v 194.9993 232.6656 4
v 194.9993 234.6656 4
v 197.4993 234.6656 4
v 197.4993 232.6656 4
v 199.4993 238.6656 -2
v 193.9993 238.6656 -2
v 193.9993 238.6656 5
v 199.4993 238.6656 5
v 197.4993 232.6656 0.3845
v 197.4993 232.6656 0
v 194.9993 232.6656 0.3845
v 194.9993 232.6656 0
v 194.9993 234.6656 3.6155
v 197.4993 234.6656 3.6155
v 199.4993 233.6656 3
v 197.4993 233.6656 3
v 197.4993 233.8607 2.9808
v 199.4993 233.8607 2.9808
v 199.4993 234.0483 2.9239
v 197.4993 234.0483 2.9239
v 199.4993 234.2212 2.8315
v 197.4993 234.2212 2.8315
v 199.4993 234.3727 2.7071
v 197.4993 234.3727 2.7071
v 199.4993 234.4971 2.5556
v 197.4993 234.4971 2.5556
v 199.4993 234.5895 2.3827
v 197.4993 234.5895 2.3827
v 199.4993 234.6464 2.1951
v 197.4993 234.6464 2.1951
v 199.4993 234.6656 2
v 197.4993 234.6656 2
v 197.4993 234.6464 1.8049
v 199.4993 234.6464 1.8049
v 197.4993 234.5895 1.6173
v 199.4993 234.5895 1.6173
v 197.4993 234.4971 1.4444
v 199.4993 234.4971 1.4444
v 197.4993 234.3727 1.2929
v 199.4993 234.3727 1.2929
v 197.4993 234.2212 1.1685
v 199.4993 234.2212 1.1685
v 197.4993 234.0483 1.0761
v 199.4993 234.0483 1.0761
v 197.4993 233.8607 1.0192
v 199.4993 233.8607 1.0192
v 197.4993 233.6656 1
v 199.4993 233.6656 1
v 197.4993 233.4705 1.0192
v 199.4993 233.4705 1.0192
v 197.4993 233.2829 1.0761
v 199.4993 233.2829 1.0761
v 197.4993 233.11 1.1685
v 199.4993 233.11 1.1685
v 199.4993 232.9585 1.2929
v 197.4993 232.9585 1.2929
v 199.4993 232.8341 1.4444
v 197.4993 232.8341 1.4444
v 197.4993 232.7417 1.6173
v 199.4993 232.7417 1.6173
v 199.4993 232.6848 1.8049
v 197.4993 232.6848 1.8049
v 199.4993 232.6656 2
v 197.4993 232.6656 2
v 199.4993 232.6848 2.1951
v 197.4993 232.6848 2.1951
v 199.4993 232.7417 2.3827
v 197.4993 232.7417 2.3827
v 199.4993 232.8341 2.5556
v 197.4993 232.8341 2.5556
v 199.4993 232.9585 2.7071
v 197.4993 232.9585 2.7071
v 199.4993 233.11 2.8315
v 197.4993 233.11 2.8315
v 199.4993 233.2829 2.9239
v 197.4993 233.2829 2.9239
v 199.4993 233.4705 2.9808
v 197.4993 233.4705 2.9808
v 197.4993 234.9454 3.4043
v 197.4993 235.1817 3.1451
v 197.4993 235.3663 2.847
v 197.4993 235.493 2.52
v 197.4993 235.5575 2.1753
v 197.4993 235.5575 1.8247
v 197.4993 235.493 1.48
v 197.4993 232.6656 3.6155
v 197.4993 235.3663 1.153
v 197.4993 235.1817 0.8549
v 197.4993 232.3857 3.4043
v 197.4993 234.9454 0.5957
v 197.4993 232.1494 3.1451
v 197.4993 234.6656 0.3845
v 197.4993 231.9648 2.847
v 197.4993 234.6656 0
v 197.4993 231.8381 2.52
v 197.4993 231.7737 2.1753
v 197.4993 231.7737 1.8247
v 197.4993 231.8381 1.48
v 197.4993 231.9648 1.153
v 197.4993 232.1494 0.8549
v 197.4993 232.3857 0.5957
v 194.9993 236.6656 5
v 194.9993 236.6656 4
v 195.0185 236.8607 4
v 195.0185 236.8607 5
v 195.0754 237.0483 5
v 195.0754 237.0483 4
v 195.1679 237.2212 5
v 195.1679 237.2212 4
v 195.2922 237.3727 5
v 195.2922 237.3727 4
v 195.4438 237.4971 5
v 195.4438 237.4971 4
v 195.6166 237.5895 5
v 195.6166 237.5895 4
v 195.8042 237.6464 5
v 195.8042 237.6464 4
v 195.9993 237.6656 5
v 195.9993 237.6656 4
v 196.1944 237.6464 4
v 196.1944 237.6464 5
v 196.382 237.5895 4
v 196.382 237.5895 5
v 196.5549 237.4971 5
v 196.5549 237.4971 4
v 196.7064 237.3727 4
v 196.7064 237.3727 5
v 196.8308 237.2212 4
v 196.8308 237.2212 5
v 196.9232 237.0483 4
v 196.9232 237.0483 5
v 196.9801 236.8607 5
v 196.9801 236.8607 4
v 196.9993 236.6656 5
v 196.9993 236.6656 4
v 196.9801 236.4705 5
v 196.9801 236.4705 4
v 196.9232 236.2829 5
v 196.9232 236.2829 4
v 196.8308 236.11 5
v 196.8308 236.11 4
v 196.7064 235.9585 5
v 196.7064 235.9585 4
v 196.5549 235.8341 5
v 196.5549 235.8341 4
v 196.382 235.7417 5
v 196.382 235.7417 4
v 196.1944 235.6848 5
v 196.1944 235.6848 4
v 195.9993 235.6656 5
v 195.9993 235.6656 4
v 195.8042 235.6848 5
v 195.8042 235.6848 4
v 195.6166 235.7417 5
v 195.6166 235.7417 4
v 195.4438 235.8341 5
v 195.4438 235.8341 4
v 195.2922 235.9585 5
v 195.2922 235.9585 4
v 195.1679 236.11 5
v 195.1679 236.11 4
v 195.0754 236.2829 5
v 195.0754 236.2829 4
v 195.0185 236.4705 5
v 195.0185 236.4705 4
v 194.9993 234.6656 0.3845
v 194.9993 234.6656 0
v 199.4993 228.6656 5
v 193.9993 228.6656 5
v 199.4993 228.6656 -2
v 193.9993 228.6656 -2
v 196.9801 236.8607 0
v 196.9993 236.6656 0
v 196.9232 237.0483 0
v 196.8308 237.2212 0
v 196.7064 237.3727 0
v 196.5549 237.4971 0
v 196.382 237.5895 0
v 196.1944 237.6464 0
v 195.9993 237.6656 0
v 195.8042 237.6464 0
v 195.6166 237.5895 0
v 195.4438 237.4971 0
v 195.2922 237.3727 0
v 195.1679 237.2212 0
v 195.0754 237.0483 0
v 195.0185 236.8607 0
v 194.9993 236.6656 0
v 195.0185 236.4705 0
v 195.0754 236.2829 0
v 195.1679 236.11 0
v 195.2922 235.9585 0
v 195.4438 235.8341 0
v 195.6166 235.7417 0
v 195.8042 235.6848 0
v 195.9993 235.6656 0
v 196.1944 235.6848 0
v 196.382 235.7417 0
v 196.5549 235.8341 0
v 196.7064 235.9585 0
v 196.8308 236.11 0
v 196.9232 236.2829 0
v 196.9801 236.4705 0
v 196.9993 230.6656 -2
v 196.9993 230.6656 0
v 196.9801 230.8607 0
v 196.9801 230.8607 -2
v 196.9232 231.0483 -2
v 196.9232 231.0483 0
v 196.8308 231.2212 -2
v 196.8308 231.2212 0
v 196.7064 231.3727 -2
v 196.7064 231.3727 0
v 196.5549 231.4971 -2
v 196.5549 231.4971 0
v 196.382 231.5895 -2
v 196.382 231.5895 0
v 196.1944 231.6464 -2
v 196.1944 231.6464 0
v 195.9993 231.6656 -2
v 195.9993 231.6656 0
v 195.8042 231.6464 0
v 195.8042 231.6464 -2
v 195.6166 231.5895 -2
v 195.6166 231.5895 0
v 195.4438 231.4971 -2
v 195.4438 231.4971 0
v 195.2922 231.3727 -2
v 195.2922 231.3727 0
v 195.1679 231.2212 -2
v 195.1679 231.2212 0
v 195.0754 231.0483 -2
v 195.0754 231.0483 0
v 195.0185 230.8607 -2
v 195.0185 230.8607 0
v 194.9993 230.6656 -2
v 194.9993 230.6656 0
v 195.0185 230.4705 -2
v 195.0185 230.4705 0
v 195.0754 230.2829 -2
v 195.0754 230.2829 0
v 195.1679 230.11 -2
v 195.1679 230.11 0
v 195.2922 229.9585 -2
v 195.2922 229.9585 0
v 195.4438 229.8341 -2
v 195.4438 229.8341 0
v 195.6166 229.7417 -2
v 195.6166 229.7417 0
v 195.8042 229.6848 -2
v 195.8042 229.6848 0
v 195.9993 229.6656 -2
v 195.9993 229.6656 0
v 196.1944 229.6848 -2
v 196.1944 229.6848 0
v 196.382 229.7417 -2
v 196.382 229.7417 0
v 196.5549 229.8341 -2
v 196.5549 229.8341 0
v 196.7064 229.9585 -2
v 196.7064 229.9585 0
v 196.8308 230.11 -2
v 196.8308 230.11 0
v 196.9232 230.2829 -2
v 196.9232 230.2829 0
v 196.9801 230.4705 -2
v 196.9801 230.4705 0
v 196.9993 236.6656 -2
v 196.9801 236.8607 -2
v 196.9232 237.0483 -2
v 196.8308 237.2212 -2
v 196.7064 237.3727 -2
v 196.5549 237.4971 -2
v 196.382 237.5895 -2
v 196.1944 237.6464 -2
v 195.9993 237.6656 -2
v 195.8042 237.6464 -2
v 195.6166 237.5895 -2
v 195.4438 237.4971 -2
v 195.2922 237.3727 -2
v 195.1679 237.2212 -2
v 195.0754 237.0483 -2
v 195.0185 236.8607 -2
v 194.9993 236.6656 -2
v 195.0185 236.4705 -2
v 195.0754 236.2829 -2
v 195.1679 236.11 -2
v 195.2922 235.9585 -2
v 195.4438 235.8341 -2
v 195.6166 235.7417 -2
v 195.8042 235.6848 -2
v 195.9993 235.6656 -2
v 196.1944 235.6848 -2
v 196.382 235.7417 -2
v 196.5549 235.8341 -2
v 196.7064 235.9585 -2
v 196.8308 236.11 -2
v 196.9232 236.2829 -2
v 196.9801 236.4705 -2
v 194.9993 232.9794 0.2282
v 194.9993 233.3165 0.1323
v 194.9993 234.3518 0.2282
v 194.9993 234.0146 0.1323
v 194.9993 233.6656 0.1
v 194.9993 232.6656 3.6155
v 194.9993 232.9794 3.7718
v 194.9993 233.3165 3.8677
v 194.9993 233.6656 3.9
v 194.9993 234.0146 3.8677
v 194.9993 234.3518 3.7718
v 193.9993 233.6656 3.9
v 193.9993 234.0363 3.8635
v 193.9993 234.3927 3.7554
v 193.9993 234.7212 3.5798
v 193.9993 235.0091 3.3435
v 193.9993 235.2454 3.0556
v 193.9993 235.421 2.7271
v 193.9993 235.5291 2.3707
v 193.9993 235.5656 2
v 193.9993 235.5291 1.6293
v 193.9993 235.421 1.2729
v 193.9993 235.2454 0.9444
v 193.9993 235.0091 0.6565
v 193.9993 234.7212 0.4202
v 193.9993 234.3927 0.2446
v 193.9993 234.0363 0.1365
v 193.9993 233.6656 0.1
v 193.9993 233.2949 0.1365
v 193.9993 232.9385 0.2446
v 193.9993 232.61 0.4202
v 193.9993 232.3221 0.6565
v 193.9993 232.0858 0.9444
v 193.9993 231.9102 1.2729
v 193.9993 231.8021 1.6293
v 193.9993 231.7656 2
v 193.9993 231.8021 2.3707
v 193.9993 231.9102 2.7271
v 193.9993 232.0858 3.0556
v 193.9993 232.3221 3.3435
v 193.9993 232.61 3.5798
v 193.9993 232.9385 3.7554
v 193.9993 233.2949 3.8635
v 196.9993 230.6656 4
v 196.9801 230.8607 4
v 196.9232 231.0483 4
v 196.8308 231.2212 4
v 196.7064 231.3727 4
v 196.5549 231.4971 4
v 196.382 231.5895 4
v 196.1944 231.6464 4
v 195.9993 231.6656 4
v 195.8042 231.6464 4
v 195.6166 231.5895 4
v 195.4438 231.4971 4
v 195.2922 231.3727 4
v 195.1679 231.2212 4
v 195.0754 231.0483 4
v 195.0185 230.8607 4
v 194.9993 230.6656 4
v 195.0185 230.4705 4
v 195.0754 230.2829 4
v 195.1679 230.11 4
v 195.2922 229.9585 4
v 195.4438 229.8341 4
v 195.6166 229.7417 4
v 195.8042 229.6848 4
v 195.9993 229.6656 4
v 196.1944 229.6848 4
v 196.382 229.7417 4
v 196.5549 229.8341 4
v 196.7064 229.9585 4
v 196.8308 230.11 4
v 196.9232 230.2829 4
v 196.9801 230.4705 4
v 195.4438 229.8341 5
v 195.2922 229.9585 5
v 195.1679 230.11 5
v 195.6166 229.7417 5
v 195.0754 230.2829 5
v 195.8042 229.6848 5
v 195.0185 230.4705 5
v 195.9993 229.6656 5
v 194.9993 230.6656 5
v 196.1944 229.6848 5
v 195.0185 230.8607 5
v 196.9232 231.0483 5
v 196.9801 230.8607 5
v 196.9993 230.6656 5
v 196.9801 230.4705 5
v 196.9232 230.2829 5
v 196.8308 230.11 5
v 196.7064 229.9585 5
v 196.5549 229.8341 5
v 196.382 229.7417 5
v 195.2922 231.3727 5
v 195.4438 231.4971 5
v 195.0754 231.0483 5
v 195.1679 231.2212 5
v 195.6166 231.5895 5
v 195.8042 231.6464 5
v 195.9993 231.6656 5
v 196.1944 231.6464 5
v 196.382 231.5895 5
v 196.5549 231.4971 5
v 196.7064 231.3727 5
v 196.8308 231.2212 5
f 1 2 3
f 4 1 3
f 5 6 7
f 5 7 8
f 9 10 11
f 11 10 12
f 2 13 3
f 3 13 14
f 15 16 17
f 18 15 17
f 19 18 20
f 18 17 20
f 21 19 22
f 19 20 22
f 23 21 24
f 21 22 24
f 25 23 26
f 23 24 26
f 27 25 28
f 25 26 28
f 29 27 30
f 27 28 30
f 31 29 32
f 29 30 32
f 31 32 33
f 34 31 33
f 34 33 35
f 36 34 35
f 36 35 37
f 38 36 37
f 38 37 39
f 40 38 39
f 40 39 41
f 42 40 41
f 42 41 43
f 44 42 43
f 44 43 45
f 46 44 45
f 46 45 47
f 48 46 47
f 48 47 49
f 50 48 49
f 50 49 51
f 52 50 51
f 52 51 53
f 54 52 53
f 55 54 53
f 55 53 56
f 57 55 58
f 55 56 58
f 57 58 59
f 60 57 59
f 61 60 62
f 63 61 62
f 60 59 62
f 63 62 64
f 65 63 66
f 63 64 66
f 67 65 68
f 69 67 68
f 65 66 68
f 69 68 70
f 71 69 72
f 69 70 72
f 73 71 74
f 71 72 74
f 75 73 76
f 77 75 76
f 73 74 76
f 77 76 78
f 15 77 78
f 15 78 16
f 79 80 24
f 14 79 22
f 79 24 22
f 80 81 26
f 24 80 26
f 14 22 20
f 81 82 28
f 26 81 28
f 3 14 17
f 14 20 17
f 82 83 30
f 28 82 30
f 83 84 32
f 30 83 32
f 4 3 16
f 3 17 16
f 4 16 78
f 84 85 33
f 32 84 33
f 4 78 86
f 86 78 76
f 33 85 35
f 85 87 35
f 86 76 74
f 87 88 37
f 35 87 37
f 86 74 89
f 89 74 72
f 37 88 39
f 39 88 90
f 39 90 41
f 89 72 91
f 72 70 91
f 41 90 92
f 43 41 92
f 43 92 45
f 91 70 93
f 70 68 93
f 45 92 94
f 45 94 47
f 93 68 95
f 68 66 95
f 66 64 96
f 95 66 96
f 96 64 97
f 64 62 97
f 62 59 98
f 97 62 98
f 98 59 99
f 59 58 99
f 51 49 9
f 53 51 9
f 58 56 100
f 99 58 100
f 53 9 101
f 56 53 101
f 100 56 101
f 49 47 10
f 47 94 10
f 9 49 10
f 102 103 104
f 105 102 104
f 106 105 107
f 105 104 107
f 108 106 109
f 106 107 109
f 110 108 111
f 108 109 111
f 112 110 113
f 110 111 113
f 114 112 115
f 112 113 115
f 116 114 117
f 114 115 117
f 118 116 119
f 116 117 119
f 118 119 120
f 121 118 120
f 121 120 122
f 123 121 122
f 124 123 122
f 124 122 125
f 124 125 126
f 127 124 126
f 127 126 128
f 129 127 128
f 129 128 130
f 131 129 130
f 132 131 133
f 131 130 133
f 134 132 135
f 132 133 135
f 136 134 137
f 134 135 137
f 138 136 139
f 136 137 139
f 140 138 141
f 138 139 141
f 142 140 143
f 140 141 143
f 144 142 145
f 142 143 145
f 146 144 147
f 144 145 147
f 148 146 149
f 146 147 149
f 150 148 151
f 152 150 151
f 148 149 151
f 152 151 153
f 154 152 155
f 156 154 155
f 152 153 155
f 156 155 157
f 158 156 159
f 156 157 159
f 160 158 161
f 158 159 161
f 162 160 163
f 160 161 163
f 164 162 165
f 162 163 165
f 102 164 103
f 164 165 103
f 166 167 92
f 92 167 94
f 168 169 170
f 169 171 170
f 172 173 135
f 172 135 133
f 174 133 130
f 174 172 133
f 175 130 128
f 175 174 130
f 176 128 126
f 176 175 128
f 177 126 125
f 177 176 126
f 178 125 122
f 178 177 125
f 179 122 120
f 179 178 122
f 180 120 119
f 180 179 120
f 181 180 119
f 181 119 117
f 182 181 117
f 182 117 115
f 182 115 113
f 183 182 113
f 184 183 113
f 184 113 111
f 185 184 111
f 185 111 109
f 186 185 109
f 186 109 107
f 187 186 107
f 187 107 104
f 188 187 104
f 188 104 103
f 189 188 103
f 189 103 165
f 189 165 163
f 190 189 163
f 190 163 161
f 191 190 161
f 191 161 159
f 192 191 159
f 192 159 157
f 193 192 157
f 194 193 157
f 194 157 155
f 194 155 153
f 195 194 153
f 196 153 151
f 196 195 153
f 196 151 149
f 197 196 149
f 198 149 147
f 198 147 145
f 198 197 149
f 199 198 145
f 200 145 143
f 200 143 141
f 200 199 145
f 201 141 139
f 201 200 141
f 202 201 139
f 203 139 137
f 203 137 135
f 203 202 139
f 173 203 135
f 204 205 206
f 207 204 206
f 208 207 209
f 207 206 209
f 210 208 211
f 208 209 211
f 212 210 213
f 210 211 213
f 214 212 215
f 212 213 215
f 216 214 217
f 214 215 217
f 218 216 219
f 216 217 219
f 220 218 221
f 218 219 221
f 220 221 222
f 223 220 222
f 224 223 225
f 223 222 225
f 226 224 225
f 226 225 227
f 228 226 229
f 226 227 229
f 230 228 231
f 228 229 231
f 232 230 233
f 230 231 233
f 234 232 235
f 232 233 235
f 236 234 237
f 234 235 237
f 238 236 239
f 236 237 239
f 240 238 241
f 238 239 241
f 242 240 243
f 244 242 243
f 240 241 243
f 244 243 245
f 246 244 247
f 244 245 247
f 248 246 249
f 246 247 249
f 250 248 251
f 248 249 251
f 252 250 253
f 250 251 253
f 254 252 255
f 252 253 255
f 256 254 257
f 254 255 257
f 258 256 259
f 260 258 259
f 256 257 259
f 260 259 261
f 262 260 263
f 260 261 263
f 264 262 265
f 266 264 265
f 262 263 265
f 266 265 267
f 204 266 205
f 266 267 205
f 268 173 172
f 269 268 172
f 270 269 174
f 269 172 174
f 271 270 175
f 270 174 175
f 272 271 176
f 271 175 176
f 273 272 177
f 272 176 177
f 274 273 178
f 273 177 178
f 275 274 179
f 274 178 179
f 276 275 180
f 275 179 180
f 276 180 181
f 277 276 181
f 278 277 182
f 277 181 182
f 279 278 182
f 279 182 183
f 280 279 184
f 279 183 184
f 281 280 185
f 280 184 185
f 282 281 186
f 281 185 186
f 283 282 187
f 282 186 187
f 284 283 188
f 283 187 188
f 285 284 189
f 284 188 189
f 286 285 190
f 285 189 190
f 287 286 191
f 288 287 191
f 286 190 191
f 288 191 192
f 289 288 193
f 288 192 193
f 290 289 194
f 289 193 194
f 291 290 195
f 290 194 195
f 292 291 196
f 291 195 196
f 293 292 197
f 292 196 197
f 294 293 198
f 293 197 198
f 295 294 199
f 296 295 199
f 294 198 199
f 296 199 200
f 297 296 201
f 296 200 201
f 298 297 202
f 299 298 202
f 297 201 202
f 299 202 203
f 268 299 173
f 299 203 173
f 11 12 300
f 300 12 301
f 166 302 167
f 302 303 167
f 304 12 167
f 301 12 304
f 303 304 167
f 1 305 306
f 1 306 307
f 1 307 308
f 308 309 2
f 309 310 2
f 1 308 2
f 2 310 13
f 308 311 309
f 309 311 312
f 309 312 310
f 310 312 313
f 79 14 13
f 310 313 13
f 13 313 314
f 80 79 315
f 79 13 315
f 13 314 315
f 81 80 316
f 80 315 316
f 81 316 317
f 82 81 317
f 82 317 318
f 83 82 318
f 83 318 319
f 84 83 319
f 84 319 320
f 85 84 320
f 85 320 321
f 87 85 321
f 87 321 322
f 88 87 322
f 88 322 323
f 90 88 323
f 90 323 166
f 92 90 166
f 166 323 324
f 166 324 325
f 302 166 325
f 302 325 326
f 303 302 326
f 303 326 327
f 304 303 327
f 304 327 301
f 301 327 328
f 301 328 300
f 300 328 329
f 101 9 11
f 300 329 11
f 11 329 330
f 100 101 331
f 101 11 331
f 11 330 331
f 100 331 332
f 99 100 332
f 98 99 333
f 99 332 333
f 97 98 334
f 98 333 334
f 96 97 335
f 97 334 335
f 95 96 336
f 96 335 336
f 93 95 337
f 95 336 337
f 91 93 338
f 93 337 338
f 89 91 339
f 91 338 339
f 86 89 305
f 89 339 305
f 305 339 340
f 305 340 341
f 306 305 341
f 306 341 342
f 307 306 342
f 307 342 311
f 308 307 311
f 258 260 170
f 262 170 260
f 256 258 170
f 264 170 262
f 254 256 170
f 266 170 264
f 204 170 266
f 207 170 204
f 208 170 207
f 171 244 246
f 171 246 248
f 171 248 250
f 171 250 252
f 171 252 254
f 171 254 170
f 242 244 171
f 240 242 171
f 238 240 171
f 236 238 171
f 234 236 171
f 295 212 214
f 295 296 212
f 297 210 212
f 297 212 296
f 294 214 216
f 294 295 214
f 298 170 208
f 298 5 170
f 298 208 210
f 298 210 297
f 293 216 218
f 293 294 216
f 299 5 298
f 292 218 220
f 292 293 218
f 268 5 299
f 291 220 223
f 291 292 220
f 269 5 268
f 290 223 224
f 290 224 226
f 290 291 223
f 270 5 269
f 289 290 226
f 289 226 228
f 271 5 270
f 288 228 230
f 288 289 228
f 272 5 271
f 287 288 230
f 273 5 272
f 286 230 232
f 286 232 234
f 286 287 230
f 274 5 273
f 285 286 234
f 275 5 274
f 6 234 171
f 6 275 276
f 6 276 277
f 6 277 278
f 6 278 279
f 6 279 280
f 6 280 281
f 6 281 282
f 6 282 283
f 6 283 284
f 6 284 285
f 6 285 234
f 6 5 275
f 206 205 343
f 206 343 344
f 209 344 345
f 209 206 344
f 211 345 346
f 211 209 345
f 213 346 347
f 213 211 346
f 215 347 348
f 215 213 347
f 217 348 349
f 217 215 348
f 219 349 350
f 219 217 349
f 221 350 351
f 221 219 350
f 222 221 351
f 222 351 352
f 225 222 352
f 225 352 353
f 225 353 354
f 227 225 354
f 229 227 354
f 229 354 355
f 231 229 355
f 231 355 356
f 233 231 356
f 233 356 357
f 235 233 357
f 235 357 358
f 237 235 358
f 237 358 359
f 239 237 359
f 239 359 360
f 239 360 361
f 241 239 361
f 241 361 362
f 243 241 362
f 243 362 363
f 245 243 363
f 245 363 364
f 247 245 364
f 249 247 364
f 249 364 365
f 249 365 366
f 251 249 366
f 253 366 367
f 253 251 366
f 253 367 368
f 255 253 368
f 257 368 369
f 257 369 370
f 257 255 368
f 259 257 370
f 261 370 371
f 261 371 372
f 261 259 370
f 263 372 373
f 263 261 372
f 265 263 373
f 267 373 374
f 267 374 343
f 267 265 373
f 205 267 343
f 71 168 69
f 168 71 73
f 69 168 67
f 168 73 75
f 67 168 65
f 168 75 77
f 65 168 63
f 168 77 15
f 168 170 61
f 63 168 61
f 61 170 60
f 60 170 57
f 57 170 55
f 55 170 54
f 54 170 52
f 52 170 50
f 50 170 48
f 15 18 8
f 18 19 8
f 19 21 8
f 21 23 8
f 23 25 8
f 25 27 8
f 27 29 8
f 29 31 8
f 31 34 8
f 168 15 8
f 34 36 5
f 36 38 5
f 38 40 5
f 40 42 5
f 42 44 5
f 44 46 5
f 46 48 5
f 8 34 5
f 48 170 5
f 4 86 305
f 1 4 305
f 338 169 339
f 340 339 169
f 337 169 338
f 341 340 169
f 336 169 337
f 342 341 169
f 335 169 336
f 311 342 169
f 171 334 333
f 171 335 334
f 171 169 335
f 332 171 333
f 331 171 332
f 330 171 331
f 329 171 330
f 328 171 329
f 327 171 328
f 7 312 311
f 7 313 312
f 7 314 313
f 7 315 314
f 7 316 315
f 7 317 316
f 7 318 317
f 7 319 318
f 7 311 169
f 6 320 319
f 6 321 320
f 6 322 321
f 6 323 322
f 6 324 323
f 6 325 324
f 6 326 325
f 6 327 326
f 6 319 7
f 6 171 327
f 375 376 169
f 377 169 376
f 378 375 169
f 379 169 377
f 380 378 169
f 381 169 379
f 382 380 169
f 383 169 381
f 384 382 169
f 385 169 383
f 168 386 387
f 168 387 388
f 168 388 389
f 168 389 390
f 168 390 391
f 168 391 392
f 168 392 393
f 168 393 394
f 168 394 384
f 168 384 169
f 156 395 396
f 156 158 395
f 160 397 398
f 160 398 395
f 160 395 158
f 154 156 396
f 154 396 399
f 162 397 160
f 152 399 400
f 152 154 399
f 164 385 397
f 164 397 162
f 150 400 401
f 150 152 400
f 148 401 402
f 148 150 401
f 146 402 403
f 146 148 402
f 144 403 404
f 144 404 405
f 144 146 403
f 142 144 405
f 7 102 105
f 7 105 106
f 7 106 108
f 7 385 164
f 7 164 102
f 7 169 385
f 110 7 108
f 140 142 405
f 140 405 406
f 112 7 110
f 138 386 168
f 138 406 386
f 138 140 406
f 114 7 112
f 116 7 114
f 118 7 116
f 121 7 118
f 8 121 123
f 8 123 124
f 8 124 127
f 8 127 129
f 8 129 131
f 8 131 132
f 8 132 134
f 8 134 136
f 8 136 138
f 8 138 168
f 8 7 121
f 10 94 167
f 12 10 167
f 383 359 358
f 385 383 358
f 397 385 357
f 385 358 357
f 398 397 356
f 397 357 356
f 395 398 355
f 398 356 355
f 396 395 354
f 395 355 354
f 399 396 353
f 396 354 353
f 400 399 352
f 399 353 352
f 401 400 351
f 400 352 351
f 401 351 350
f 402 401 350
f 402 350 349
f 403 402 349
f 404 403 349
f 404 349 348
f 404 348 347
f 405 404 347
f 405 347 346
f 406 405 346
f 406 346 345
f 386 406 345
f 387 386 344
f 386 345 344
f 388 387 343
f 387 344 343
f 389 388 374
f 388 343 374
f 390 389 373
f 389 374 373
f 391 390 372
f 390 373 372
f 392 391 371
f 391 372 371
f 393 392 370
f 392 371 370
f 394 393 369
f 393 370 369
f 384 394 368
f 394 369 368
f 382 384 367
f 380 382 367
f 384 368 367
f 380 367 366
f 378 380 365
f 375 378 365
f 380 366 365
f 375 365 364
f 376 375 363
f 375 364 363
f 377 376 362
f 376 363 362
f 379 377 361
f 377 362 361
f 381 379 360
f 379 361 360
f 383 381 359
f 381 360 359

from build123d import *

# Parameters (mm, degrees)
MODEL_R                  = 1
EXTRUDE_1_DEPTH          = 4
SKETCH_1_R               = 1
CUT_EXTRUDE_1_DEPTH      = 5
CUT_EXTRUDE_1_DEPTH_BACK = 3
SKETCH_2_R               = 1.9
CUT_EXTRUDE_2_DEPTH      = 3.5
SKETCH_4_W               = 5.5
SKETCH_4_H               = 10
EXTRUDE_2_DEPTH          = 2
SKETCH_5_R               = 1
CUT_EXTRUDE_3_DEPTH      = 2
SKETCH_6_R               = 1
CUT_EXTRUDE_4_DEPTH      = 2
SKETCH_7_W               = 5.5
SKETCH_7_H               = 10
EXTRUDE_3_DEPTH          = 1
SKETCH_8_R               = 1
CUT_EXTRUDE_5_DEPTH      = 1


with BuildPart() as part:
    # Model → 凸台-拉伸1 (new body)
    with BuildSketch(Plane.XY):
        Polygon((199.499322294, 238.665580803), (199.499322294, 228.665580803), (193.999322294, 228.665580803), (193.999322294, 232.665580803), (193.999322294, 234.665580803), (193.999322294, 238.665580803), align=None)
        with Locations((195.999322294, 236.665580803)):
            Circle(MODEL_R, mode=Mode.SUBTRACT)
        with Locations((195.999322294, 230.665580803)):
            Circle(MODEL_R, mode=Mode.SUBTRACT)
        Polygon((195.999322294, 234.665580803), (197.499322294, 234.665580803), (197.499322294, 232.665580803), (195.999322294, 232.665580803), (194.999322294, 232.665580803), (194.999322294, 234.665580803), align=None, mode=Mode.SUBTRACT)
    extrude(amount=EXTRUDE_1_DEPTH)

    # 草图1 → 切除-拉伸1 (cut, two sides)
    with BuildSketch(Plane.ZY.offset(-197.499322294)) as cut_extrude_1_sk:
        with Locations((2, 233.665580803)):
            Circle(SKETCH_1_R)
    extrude(amount=CUT_EXTRUDE_1_DEPTH, mode=Mode.SUBTRACT)
    extrude(cut_extrude_1_sk.sketch, amount=-CUT_EXTRUDE_1_DEPTH_BACK, mode=Mode.SUBTRACT)

    # 草图2 → 切除-拉伸2 (cut)
    with BuildSketch(Plane.ZY.offset(-193.999322294)):
        with Locations((2, 233.665580803)):
            Circle(SKETCH_2_R)
    extrude(amount=-CUT_EXTRUDE_2_DEPTH, mode=Mode.SUBTRACT)

    # 草图4 → 凸台-拉伸2 (add)
    with BuildSketch(Plane(origin=(0, 0, 0), x_dir=(-1, 0, 0), z_dir=(0, 0, -1))):
        with Locations((-196.749322294, 233.665580803)):
            Rectangle(SKETCH_4_W, SKETCH_4_H)
    extrude(amount=EXTRUDE_2_DEPTH)

    # 草图5 → 切除-拉伸3 (cut)
    with BuildSketch(Plane.XY):
        with Locations((195.999322294, 236.665580803)):
            Circle(SKETCH_5_R)
    extrude(amount=-CUT_EXTRUDE_3_DEPTH, mode=Mode.SUBTRACT)

    # 草图6 → 切除-拉伸4 (cut)
    with BuildSketch(Plane.XY):
        with Locations((195.999322294, 230.665580803)):
            Circle(SKETCH_6_R)
    extrude(amount=-CUT_EXTRUDE_4_DEPTH, mode=Mode.SUBTRACT)

    # 草图7 → 凸台-拉伸3 (add)
    with BuildSketch(Plane.XY.offset(4)):
        with Locations((196.749322294, 233.665580803)):
            Rectangle(SKETCH_7_W, SKETCH_7_H)
    extrude(amount=EXTRUDE_3_DEPTH)

    # 草图8 → 切除-拉伸5 (cut)
    with BuildSketch(Plane(origin=(0, 0, 4), x_dir=(-1, 0, 0), z_dir=(0, 0, -1))):
        with Locations((-195.999322294, 236.665580803)):
            Circle(SKETCH_8_R)
        with Locations((-195.999322294, 230.665580803)):
            Circle(SKETCH_8_R)
    extrude(amount=-CUT_EXTRUDE_5_DEPTH, mode=Mode.SUBTRACT)


solid = part.part
